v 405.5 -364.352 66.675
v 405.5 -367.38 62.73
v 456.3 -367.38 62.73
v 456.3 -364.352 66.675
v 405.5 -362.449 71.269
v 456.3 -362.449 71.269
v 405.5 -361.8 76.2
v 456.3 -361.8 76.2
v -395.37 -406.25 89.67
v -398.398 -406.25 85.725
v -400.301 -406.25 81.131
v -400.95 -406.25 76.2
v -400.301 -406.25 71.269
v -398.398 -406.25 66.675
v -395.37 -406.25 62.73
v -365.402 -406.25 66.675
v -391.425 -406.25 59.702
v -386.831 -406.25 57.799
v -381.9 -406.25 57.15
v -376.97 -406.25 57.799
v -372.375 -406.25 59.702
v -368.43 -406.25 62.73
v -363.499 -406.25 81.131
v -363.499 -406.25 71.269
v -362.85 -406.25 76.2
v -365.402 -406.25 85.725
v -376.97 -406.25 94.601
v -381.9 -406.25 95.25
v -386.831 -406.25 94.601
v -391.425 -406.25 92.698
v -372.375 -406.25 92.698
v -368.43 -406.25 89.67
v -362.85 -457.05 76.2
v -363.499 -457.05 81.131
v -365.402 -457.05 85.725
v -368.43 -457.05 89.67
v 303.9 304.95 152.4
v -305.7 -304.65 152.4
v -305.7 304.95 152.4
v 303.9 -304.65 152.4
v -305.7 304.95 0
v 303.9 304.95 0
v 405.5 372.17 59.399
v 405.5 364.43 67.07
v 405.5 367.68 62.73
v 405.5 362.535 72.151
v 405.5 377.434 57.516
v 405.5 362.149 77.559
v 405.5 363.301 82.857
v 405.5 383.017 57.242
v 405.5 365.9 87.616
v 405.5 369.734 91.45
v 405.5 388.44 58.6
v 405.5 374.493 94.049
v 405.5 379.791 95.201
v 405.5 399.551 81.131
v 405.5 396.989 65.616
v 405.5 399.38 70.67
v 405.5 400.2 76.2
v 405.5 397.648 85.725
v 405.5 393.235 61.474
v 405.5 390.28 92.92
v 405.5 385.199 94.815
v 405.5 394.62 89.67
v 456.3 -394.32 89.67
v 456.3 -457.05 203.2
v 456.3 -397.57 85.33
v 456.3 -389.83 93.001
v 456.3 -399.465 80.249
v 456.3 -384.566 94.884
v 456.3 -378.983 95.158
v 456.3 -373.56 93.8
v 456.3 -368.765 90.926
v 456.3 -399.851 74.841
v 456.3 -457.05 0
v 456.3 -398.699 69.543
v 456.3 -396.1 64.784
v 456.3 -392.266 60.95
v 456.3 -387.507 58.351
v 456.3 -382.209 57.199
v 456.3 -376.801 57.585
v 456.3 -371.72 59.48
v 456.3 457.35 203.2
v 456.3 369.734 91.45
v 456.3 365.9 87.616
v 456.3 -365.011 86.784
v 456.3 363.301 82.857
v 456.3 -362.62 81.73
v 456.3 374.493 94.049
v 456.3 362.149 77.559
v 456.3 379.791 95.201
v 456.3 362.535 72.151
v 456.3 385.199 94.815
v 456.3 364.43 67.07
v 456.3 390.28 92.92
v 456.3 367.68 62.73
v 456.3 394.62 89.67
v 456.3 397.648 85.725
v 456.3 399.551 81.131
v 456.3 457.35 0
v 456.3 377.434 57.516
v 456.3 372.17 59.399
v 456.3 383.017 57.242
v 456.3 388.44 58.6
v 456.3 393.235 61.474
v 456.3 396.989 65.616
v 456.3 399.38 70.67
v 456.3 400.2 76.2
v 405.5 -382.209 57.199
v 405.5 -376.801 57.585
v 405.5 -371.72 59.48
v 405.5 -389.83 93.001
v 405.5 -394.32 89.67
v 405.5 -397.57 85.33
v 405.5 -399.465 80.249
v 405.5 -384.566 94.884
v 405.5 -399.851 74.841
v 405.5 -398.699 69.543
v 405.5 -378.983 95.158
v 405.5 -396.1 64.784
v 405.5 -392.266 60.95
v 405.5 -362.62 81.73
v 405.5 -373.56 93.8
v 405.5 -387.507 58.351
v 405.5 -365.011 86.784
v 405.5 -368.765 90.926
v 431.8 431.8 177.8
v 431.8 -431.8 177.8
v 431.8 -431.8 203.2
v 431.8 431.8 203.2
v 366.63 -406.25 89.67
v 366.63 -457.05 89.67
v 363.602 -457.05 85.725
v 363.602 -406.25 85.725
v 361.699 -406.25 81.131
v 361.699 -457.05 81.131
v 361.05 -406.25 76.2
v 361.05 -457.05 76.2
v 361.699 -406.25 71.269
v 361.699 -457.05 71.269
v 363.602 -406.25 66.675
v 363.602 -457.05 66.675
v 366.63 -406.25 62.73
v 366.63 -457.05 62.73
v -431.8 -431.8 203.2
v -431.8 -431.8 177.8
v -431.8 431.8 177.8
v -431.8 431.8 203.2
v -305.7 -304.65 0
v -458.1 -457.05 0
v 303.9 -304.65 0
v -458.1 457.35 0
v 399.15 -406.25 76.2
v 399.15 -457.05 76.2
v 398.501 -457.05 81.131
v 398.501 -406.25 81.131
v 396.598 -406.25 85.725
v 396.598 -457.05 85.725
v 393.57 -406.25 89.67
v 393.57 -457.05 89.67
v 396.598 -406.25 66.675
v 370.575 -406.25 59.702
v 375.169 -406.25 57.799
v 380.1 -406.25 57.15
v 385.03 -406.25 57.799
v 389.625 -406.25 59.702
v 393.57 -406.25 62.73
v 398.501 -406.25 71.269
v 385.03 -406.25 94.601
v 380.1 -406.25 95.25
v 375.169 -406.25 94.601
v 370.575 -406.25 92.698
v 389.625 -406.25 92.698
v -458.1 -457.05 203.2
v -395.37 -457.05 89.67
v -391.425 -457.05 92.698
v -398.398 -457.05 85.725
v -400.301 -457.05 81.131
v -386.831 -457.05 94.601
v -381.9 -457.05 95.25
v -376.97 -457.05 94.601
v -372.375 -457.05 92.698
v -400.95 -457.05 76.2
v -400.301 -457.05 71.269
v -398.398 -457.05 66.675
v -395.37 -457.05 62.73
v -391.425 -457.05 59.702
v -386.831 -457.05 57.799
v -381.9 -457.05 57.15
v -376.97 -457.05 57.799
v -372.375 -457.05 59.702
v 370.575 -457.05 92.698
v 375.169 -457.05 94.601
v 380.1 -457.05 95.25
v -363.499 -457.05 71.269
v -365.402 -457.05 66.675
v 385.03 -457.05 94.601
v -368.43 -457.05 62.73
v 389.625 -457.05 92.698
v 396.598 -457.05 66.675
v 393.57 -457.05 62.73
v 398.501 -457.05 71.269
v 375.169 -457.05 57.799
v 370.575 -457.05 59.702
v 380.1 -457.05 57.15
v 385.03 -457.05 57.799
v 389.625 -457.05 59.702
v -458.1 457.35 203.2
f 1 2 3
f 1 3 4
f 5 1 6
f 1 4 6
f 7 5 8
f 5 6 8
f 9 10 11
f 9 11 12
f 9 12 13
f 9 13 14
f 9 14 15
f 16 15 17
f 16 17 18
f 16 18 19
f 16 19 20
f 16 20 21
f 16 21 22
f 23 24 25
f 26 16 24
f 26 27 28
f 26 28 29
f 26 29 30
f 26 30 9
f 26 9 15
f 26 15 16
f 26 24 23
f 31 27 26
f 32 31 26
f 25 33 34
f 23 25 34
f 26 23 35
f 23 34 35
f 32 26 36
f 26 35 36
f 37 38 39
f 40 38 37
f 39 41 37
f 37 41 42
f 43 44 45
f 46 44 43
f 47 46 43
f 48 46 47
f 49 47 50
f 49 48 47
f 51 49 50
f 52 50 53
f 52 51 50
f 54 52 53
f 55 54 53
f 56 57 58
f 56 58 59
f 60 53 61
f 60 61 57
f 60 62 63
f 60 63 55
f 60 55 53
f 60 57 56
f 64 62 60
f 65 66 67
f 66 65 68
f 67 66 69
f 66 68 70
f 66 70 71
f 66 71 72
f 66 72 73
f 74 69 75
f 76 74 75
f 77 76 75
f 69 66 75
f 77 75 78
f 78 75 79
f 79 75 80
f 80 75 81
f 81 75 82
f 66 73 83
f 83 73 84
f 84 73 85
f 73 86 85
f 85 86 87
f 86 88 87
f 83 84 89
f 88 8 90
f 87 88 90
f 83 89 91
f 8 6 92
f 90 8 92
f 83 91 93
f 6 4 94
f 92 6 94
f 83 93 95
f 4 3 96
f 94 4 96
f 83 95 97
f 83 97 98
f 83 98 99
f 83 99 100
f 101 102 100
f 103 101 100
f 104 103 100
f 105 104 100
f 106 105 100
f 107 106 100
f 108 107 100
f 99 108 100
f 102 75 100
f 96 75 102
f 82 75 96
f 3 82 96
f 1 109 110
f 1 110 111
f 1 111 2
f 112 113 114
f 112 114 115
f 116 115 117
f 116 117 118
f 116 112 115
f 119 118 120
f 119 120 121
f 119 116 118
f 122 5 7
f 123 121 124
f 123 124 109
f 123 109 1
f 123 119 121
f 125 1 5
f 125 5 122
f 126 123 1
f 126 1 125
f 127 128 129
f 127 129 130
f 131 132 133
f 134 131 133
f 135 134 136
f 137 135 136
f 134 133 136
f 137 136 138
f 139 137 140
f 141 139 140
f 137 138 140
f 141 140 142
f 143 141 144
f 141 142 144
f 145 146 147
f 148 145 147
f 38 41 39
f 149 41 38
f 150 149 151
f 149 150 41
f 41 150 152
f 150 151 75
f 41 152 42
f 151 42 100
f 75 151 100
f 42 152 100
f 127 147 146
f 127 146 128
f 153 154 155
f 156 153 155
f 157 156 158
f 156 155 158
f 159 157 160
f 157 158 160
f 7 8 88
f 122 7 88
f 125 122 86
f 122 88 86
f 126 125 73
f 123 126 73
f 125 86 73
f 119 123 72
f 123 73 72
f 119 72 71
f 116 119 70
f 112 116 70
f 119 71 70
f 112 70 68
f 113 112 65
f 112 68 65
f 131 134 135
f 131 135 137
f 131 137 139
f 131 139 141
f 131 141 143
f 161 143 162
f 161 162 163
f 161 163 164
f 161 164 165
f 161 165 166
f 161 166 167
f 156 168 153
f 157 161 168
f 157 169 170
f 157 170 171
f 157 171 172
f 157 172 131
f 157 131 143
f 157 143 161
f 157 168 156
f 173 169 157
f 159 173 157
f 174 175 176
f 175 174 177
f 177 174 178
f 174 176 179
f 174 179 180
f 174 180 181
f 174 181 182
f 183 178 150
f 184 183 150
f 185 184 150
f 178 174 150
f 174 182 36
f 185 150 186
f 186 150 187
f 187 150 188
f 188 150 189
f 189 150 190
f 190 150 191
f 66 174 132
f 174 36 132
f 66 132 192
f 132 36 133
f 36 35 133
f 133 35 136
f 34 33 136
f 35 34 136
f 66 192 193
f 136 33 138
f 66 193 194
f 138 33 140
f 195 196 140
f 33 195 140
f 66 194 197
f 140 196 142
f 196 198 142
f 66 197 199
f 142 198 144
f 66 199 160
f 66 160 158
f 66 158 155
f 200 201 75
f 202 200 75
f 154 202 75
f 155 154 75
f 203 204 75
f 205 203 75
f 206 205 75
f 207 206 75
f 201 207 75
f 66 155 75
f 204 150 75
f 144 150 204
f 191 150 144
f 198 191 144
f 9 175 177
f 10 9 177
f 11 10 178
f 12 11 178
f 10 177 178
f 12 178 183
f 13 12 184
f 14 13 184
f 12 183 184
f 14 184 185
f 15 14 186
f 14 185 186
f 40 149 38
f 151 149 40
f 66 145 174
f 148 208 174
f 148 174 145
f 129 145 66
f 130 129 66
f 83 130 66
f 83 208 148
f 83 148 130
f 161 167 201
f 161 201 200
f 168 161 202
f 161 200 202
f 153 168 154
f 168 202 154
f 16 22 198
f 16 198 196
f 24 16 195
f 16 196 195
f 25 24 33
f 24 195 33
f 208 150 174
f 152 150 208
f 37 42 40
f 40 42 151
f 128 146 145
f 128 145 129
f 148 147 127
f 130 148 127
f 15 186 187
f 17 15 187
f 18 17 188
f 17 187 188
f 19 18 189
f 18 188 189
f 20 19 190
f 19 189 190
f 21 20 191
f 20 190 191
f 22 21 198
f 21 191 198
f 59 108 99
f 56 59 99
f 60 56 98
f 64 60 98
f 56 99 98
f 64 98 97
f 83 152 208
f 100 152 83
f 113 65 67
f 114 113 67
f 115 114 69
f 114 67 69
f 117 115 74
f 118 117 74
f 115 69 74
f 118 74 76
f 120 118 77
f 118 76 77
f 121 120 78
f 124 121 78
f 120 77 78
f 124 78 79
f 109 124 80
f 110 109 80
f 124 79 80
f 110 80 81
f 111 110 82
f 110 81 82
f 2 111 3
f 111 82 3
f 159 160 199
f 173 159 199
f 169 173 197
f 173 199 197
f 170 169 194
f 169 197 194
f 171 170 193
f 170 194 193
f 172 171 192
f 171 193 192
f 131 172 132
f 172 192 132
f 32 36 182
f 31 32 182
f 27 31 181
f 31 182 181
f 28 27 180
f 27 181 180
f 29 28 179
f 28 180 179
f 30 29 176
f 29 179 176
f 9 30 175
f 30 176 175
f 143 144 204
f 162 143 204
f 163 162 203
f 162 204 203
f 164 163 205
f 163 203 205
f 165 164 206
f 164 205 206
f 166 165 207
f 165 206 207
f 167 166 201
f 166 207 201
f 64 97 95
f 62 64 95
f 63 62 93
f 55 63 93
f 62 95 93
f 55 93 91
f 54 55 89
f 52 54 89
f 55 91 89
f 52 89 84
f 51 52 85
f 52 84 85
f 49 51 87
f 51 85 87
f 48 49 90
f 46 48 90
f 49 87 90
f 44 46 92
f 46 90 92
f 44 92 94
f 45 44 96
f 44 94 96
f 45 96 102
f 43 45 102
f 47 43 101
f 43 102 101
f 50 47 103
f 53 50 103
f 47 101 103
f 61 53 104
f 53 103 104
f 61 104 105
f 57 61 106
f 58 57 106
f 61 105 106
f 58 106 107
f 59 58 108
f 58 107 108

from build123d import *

# Parameters (mm, degrees)
F0_W      = 914.4
F0_H      = 914.4
F1_DEPTH  = 177.8
F2_W      = 609.6
F2_H      = 609.6
F3_DEPTH  = 152.4
F6_DEPTH  = 50.8
F8_DEPTH  = 50.8
F9_W      = 914.4
F9_H      = 914.4
F9_W_2    = 863.6
F9_H_2    = 863.6
F10_DEPTH = 25.4


with BuildPart() as f1:
    # F0 (on Top) → F1 (new body)
    with BuildSketch(Plane.XY):
        with Locations((-0.90002447, 0.1499950886)):
            Rectangle(F0_W, F0_H)
    extrude(amount=F1_DEPTH)

    # F2 (on face) → F3 (cut)
    with BuildSketch(Plane(origin=(0, 0, 0), x_dir=(1, 0, 0), z_dir=(0, 0, -1))):
        with Locations((-0.90002447, -0.1499950886)):
            Rectangle(F2_W, F2_H)
    extrude(amount=-F3_DEPTH, mode=Mode.SUBTRACT)

    # F5 (on face) → F6 (cut)
    with BuildSketch(Plane.XZ.offset(457.0500049114)):
        with BuildLine():
            Line((380.09997553, 76.2), (393.5703597116, 62.7296158184))
            ThreePointArc((393.5703597116, 62.7296158184), (397.6998806243, 68.9098806134), (399.14997553, 76.2))
            ThreePointArc((399.14997553, 76.2), (397.6998806243, 83.4901193866), (393.5703597116, 89.6703841816))
            Line((393.5703597116, 89.6703841816), (380.09997553, 76.2))
        make_face()
        with BuildLine():
            Line((380.09997553, 76.2), (393.5703597116, 89.6703841816))
            ThreePointArc((393.5703597116, 89.6703841816), (380.09997553, 95.25), (366.6295913484, 89.6703841816))
            Line((366.6295913484, 89.6703841816), (380.09997553, 76.2))
        make_face()
        with BuildLine():
            ThreePointArc((366.6295913484, 89.6703841816), (361.04997553, 76.2), (366.6295913484, 62.7296158184))
            Line((366.6295913484, 62.7296158184), (380.09997553, 76.2))
            Line((380.09997553, 76.2), (366.6295913484, 89.6703841816))
        make_face()
        with BuildLine():
            ThreePointArc((366.6295913484, 62.7296158184), (380.09997553, 57.15), (393.5703597116, 62.7296158184))
            Line((393.5703597116, 62.7296158184), (380.09997553, 76.2))
            Line((380.09997553, 76.2), (366.6295913484, 62.7296158184))
        make_face()
        with BuildLine():
            Line((-381.90002447, 76.2), (-368.4296402884, 62.7296158184))
            ThreePointArc((-368.4296402884, 62.7296158184), (-364.3001193757, 68.9098806134), (-362.85002447, 76.2))
            ThreePointArc((-362.85002447, 76.2), (-364.3001193757, 83.4901193866), (-368.4296402884, 89.6703841816))
            Line((-368.4296402884, 89.6703841816), (-381.90002447, 76.2))
        make_face()
        with BuildLine():
            Line((-381.90002447, 76.2), (-368.4296402884, 89.6703841816))
            ThreePointArc((-368.4296402884, 89.6703841816), (-381.90002447, 95.25), (-395.3704086516, 89.6703841816))
            Line((-395.3704086516, 89.6703841816), (-381.90002447, 76.2))
        make_face()
        with BuildLine():
            ThreePointArc((-395.3704086516, 89.6703841816), (-400.95002447, 76.2), (-395.3704086516, 62.7296158184))
            Line((-395.3704086516, 62.7296158184), (-381.90002447, 76.2))
            Line((-381.90002447, 76.2), (-395.3704086516, 89.6703841816))
        make_face()
        with BuildLine():
            ThreePointArc((-395.3704086516, 62.7296158184), (-381.90002447, 57.15), (-368.4296402884, 62.7296158184))
            Line((-368.4296402884, 62.7296158184), (-381.90002447, 76.2))
            Line((-381.90002447, 76.2), (-395.3704086516, 62.7296158184))
        make_face()
    extrude(amount=-F6_DEPTH, mode=Mode.SUBTRACT)

    # F7 (on face) → F8 (cut)
    with BuildSketch(Plane.YZ.offset(456.29997553)):
        with BuildLine():
            Line((394.6203792702, 89.6703841816), (367.679610907, 62.7296158184))
            ThreePointArc((367.679610907, 62.7296158184), (388.4401144751, 58.6000949057), (400.1999950886, 76.2))
            ThreePointArc((400.1999950886, 76.2), (398.7499001829, 83.4901193866), (394.6203792702, 89.6703841816))
        make_face()
        with BuildLine():
            ThreePointArc((394.6203792702, 89.6703841816), (367.679610907, 89.6703841816), (367.679610907, 62.7296158184))
            Line((367.679610907, 62.7296158184), (394.6203792702, 89.6703841816))
        make_face()
        with BuildLine():
            Line((-394.320389093, 89.6703841816), (-367.3796207298, 62.7296158184))
            ThreePointArc((-367.3796207298, 62.7296158184), (-363.2500998171, 68.9098806134), (-361.8000049114, 76.2))
            ThreePointArc((-361.8000049114, 76.2), (-373.5598855249, 93.7999050943), (-394.320389093, 89.6703841816))
        make_face()
        with BuildLine():
            ThreePointArc((-394.320389093, 89.6703841816), (-394.320389093, 62.7296158184), (-367.3796207298, 62.7296158184))
            Line((-367.3796207298, 62.7296158184), (-394.320389093, 89.6703841816))
        make_face()
    extrude(amount=-F8_DEPTH, mode=Mode.SUBTRACT)

    # F9 (on face) → F10 (join)
    with BuildSketch(Plane.XY.offset(177.8)):
        with Locations((-0.90002447, 0.1499950886)):
            Rectangle(F9_W, F9_H)
        Rectangle(F9_W_2, F9_H_2, mode=Mode.SUBTRACT)
    extrude(amount=F10_DEPTH)


solid = f1.part
